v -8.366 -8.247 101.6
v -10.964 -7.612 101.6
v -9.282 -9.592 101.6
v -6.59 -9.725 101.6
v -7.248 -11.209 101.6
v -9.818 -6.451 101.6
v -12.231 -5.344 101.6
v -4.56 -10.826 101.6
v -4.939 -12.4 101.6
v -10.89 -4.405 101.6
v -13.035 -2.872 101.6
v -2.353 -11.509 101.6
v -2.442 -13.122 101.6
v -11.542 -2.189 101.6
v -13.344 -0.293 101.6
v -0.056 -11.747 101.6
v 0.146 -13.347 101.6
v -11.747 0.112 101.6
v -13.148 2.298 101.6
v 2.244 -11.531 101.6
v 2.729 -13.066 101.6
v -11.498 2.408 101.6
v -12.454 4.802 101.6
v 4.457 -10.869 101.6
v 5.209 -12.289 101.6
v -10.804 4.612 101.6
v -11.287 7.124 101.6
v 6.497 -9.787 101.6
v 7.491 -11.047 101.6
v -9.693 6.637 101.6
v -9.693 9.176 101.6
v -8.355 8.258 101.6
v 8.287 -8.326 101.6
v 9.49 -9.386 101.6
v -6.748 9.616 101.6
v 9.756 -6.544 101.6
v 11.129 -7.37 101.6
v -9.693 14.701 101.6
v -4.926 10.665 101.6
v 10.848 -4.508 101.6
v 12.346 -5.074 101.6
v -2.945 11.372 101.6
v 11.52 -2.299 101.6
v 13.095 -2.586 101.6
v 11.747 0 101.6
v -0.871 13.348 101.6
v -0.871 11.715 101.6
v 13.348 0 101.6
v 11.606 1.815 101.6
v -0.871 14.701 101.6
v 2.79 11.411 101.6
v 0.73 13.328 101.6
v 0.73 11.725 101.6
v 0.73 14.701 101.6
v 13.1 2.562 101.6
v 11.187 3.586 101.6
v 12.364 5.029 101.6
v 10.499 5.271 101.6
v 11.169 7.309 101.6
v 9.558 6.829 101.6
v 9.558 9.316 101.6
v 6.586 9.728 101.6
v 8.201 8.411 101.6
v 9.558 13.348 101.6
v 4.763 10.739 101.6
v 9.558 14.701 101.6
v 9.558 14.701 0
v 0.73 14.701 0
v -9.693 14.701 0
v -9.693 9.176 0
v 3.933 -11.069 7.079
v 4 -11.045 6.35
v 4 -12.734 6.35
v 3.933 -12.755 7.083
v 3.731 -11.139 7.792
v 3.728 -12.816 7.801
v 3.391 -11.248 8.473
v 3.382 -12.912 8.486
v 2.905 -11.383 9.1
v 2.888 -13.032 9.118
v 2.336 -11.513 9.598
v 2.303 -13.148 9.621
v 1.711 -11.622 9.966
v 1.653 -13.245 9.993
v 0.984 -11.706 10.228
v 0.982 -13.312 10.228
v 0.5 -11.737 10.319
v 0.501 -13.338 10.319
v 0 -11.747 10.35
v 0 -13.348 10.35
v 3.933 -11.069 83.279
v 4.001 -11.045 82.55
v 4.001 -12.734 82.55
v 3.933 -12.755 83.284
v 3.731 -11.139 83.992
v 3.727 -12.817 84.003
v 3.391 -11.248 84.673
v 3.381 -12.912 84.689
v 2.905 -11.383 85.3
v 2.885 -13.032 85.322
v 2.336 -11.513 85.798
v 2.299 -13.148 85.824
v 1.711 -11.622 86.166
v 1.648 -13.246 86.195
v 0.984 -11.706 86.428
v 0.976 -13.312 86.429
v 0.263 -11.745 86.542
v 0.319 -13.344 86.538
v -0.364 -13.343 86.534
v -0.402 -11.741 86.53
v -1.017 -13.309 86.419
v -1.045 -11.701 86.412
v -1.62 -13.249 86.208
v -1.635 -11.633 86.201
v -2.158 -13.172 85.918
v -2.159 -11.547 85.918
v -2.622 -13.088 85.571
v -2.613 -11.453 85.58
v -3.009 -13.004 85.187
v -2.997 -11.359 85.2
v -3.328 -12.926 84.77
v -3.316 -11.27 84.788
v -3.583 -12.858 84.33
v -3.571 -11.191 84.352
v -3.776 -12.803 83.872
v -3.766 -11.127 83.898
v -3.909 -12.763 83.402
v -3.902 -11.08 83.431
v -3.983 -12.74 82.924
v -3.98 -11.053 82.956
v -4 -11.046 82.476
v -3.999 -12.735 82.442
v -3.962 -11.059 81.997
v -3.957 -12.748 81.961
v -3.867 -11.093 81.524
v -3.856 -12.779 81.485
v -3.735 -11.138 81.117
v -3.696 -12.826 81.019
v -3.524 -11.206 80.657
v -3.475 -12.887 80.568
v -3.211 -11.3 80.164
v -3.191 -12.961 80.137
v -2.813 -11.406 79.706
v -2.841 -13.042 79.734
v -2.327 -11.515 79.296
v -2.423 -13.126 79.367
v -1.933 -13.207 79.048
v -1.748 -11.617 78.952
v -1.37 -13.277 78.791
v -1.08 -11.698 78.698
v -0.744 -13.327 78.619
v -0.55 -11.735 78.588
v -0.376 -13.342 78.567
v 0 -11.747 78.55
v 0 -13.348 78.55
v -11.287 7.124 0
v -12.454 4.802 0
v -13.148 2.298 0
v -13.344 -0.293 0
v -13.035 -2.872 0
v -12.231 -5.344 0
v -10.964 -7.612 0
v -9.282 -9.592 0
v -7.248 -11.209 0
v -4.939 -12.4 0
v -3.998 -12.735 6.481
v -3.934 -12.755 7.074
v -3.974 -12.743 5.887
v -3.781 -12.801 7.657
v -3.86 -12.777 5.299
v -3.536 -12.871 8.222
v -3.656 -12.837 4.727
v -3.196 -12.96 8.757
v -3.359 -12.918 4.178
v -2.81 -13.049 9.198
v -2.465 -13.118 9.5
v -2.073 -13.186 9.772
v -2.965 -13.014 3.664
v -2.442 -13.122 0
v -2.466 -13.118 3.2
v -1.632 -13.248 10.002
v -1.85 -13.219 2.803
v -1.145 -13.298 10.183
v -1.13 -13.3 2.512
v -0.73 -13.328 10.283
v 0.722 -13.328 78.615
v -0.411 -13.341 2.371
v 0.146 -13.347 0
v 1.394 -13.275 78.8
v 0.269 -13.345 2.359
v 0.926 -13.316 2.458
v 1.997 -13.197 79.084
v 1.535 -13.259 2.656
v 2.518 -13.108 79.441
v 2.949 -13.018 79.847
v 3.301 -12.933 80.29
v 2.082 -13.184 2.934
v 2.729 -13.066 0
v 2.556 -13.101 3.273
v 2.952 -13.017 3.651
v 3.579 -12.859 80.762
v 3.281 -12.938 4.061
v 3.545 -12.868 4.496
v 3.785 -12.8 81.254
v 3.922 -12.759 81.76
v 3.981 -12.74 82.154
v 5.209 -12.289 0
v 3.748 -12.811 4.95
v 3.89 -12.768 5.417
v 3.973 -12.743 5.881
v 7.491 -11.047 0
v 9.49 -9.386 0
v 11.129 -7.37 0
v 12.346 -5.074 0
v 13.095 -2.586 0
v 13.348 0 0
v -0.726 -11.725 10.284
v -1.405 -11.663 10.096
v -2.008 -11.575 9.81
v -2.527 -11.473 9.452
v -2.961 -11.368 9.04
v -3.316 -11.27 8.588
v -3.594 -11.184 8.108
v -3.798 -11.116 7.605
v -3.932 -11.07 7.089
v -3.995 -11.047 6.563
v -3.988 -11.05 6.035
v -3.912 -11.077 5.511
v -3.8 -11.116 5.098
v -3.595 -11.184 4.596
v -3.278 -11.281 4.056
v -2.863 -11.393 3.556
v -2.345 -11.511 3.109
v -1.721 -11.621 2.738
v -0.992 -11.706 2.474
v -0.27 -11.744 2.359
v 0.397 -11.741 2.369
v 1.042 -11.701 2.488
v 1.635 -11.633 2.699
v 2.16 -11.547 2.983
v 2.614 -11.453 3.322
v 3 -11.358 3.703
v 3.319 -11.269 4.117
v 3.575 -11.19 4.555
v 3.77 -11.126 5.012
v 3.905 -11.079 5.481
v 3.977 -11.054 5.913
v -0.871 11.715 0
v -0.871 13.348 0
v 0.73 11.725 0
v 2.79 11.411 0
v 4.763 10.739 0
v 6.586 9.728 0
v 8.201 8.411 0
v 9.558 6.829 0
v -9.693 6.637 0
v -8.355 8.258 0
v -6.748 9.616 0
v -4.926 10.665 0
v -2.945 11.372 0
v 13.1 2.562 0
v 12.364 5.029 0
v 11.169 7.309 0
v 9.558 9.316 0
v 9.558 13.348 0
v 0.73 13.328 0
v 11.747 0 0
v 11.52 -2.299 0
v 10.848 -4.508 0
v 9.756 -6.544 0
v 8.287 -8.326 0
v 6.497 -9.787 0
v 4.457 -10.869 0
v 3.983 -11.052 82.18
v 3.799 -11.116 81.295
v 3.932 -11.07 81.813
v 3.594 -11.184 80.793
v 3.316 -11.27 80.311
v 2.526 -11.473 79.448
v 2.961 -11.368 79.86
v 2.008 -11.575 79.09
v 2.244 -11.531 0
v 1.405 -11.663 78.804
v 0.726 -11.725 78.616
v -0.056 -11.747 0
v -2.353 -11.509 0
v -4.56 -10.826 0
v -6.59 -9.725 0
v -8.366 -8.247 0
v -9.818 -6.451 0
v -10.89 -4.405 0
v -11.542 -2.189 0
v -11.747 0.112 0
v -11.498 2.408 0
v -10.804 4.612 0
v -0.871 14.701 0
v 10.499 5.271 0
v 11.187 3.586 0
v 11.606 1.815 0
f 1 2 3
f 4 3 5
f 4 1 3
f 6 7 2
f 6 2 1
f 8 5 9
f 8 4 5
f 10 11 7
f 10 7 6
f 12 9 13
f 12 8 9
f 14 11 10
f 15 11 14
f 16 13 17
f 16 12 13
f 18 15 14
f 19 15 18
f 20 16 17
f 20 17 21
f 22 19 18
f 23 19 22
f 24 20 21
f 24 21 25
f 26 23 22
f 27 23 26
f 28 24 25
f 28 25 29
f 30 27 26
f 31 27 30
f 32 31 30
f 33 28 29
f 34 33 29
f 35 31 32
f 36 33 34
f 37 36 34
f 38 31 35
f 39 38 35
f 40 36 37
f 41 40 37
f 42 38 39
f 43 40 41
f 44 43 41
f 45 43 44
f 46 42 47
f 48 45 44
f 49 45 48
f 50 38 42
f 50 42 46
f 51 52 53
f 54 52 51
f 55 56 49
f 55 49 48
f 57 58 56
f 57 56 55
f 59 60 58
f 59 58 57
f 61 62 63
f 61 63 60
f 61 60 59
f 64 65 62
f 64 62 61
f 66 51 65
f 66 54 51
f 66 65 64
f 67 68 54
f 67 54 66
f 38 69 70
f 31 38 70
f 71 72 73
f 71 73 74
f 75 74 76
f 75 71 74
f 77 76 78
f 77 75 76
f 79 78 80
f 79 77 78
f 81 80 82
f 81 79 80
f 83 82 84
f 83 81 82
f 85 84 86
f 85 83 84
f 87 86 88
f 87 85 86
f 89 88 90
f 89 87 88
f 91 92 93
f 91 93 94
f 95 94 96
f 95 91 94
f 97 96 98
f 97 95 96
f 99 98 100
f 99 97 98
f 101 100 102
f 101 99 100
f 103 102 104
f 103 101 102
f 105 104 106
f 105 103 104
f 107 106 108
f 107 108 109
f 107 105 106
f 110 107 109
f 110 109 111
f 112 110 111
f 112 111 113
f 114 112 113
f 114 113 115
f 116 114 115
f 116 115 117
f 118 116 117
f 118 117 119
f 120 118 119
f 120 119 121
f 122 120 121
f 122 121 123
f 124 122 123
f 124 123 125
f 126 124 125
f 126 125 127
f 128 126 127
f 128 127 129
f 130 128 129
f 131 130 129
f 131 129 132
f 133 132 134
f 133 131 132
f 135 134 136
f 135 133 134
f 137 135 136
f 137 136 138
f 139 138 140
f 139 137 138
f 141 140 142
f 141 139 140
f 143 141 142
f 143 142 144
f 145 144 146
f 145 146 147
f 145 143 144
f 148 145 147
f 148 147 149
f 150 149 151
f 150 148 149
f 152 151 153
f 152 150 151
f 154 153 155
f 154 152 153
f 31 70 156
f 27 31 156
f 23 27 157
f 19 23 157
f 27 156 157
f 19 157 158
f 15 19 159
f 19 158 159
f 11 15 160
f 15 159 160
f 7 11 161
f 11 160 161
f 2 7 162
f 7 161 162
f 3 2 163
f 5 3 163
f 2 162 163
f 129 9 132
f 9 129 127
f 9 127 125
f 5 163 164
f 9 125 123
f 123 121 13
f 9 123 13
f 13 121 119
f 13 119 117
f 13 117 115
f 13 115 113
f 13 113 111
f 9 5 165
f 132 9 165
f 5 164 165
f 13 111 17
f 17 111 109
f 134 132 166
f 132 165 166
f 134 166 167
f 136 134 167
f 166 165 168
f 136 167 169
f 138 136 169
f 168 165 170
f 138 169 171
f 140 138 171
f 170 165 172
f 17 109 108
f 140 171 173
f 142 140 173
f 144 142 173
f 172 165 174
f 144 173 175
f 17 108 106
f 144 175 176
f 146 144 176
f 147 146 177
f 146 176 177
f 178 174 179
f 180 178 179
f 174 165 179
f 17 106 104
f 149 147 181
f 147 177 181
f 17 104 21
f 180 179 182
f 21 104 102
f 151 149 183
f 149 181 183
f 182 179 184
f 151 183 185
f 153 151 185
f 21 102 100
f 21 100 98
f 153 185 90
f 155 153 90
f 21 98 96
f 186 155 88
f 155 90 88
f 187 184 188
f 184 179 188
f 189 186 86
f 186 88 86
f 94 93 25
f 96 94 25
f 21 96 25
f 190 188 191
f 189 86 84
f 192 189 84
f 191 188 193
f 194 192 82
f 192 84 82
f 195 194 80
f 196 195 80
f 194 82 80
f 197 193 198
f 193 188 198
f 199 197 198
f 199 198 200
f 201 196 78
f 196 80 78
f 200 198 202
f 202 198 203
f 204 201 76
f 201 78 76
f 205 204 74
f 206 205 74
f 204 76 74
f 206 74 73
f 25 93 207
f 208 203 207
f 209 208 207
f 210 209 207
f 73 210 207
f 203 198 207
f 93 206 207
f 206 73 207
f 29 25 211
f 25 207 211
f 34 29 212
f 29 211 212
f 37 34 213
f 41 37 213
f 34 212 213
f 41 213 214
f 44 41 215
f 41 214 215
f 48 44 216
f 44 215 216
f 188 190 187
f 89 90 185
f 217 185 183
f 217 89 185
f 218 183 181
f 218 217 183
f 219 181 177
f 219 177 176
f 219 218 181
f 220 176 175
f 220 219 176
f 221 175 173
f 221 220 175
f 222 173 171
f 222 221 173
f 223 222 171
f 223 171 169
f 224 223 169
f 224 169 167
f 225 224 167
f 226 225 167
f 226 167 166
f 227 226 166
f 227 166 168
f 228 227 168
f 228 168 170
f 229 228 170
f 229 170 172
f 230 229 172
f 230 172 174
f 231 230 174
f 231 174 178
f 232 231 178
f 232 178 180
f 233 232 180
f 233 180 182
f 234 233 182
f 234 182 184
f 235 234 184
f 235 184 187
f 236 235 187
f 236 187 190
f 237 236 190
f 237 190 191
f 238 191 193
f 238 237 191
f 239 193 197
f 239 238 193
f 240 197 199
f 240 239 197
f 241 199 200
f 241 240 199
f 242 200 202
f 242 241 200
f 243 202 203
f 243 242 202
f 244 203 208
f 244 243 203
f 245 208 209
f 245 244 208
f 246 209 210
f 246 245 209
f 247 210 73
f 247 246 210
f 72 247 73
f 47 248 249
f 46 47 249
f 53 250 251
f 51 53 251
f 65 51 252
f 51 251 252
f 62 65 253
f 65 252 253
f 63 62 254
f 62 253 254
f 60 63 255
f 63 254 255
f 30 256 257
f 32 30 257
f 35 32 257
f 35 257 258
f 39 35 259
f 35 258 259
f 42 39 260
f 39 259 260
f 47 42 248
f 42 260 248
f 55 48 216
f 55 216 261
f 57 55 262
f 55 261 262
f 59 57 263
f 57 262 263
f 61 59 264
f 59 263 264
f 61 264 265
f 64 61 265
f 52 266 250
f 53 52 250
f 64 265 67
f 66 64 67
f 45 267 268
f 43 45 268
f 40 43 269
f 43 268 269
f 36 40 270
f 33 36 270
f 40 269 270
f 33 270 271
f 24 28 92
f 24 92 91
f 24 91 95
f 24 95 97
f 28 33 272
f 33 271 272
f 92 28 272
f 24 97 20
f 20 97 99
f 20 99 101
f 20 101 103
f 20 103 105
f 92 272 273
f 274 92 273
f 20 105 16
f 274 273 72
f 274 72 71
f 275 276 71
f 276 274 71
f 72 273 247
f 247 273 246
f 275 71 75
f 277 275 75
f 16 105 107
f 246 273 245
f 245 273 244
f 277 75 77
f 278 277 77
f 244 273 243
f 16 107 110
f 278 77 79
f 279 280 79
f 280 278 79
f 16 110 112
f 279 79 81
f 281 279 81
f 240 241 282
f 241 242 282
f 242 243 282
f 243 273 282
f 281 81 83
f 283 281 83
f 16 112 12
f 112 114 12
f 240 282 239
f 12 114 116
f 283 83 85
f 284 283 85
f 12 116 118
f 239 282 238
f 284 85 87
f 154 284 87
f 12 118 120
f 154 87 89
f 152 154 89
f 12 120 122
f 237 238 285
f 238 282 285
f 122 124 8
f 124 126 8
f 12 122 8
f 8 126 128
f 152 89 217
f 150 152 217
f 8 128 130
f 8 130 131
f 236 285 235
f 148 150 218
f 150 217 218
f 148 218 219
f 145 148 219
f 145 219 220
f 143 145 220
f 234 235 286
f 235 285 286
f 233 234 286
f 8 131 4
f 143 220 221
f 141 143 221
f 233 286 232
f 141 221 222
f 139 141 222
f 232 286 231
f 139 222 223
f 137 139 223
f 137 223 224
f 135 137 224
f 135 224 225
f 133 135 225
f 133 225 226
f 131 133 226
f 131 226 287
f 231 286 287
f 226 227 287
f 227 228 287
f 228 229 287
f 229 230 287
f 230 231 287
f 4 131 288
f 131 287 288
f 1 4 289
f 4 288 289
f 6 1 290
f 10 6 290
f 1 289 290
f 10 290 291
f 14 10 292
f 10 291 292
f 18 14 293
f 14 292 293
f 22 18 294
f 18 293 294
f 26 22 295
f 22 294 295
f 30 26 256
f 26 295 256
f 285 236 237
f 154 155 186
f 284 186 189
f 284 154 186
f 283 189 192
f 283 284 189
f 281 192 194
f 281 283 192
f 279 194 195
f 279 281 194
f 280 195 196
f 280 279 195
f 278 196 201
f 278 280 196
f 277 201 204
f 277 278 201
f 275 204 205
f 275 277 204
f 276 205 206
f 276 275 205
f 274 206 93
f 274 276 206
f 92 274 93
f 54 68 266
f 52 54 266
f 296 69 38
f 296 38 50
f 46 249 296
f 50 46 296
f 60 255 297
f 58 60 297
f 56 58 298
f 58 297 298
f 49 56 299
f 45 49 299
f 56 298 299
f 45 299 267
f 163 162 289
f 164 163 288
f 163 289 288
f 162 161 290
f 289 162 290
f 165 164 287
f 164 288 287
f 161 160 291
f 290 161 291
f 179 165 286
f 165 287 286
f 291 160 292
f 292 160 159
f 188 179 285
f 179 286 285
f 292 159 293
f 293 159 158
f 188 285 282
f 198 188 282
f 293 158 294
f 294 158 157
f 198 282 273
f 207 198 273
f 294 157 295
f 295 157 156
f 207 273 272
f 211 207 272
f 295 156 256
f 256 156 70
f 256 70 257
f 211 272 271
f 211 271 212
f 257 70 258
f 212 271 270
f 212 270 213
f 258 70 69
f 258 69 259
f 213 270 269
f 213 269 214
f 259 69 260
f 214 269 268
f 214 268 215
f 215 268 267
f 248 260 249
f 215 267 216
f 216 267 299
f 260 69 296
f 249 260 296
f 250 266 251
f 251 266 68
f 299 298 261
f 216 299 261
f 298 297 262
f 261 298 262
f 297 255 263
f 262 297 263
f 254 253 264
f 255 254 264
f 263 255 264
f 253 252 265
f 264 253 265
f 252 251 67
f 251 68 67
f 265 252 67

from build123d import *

# Parameters (mm, degrees)
F0_W     = 8.8289421401
F0_H     = 1.353359101
F0_W_2   = 8.8226038183
F1_DEPTH = 101.6
F3_DEPTH = 25.4


with BuildPart() as f1:
    # F0 (on Top) → F1 (new body)
    with BuildSketch(Plane.XY):
        with Locations((5.1440017123, 14.0243795505)):
            Rectangle(F0_W, F0_H)
        with Locations((-5.2819712669, 14.0243795505)):
            Rectangle(F0_W_2, F0_H)
        with BuildLine():
            Line((-9.693273176, 13.3477), (-9.693273176, 9.1761402793))
            ThreePointArc((-9.693273176, 9.1761402793), (-5.67367671, 12.0818246917), (-0.8706693577, 13.319272884))
            Line((-0.8706693577, 13.319272884), (-0.8706693577, 13.3477))
            Line((-0.8706693577, 13.3477), (-9.693273176, 13.3477))
        make_face()
        with BuildLine():
            Line((-9.693273176, 9.1761402793), (-9.693273176, 6.6365813025))
            ThreePointArc((-9.693273176, 6.6365813025), (-5.8606559871, 10.1811820361), (-0.8706693577, 11.7151906139))
            Line((-0.8706693577, 11.7151906139), (-0.8706693577, 13.319272884))
            ThreePointArc((-0.8706693577, 13.319272884), (-5.67367671, 12.0818246917), (-9.693273176, 9.1761402793))
        make_face()
        with BuildLine():
            ThreePointArc((0.7295306423, 13.3277485095), (5.5211714169, 12.152273922), (9.5584727824, 9.3164742987))
            Line((9.5584727824, 9.3164742987), (9.5584727824, 13.3477))
            Line((9.5584727824, 13.3477), (0.7295306423, 13.3477))
            Line((0.7295306423, 13.3477), (0.7295306423, 13.3277485095))
        make_face()
        with BuildLine():
            ThreePointArc((0.7295306423, 11.7248258534), (5.6966915069, 10.2738241237), (9.5584727824, 6.8293011589))
            Line((9.5584727824, 6.8293011589), (9.5584727824, 9.3164742987))
            ThreePointArc((9.5584727824, 9.3164742987), (5.5211714169, 12.152273922), (0.7295306423, 13.3277485095))
            Line((0.7295306423, 13.3277485095), (0.7295306423, 11.7248258534))
        make_face()
        with BuildLine():
            ThreePointArc((11.7475, 0), (-3.4736169632, -11.2221986011), (-9.693273176, 6.6365813025))
            Line((-9.693273176, 6.6365813025), (-9.693273176, 9.1761402793))
            ThreePointArc((-9.693273176, 9.1761402793), (-4.9385318121, -12.4004838144), (13.3477, 0))
            ThreePointArc((13.3477, 0), (12.3641563086, 5.0287905172), (9.5584727824, 9.3164742987))
            Line((9.5584727824, 9.3164742987), (9.5584727824, 6.8293011589))
            ThreePointArc((9.5584727824, 6.8293011589), (11.1868654068, 3.5857772685), (11.7475, 0))
        make_face()
    extrude(amount=F1_DEPTH)


with BuildPart() as f3:
    # F2 (on Front) → F3 (new body)
    with BuildSketch(Plane.XZ):
        with BuildLine():
            ThreePointArc((4.0005, 82.55), (-2.8287806781, 85.3787806781), (0, 78.5495))
            ThreePointArc((0, 78.5495), (2.8287806781, 79.7212193219), (4.0005, 82.55))
        make_face()
    extrude(amount=F3_DEPTH)


with BuildPart() as f3b:
    # F2 (on Front) → F3, piece 2 (new body)
    with BuildSketch(Plane.XZ):
        with BuildLine():
            ThreePointArc((0, 10.3505), (-2.8287806781, 3.5212193219), (4.0005, 6.35))
            ThreePointArc((4.0005, 6.35), (2.8287806781, 9.1787806781), (0, 10.3505))
        make_face()
    extrude(amount=F3_DEPTH)


with BuildPart() as f1_1:
    add(f1.part)

    # F4: cut F3, F3b
    add(f3.part, mode=Mode.SUBTRACT)
    add(f3b.part, mode=Mode.SUBTRACT)


solid = f1_1.part
